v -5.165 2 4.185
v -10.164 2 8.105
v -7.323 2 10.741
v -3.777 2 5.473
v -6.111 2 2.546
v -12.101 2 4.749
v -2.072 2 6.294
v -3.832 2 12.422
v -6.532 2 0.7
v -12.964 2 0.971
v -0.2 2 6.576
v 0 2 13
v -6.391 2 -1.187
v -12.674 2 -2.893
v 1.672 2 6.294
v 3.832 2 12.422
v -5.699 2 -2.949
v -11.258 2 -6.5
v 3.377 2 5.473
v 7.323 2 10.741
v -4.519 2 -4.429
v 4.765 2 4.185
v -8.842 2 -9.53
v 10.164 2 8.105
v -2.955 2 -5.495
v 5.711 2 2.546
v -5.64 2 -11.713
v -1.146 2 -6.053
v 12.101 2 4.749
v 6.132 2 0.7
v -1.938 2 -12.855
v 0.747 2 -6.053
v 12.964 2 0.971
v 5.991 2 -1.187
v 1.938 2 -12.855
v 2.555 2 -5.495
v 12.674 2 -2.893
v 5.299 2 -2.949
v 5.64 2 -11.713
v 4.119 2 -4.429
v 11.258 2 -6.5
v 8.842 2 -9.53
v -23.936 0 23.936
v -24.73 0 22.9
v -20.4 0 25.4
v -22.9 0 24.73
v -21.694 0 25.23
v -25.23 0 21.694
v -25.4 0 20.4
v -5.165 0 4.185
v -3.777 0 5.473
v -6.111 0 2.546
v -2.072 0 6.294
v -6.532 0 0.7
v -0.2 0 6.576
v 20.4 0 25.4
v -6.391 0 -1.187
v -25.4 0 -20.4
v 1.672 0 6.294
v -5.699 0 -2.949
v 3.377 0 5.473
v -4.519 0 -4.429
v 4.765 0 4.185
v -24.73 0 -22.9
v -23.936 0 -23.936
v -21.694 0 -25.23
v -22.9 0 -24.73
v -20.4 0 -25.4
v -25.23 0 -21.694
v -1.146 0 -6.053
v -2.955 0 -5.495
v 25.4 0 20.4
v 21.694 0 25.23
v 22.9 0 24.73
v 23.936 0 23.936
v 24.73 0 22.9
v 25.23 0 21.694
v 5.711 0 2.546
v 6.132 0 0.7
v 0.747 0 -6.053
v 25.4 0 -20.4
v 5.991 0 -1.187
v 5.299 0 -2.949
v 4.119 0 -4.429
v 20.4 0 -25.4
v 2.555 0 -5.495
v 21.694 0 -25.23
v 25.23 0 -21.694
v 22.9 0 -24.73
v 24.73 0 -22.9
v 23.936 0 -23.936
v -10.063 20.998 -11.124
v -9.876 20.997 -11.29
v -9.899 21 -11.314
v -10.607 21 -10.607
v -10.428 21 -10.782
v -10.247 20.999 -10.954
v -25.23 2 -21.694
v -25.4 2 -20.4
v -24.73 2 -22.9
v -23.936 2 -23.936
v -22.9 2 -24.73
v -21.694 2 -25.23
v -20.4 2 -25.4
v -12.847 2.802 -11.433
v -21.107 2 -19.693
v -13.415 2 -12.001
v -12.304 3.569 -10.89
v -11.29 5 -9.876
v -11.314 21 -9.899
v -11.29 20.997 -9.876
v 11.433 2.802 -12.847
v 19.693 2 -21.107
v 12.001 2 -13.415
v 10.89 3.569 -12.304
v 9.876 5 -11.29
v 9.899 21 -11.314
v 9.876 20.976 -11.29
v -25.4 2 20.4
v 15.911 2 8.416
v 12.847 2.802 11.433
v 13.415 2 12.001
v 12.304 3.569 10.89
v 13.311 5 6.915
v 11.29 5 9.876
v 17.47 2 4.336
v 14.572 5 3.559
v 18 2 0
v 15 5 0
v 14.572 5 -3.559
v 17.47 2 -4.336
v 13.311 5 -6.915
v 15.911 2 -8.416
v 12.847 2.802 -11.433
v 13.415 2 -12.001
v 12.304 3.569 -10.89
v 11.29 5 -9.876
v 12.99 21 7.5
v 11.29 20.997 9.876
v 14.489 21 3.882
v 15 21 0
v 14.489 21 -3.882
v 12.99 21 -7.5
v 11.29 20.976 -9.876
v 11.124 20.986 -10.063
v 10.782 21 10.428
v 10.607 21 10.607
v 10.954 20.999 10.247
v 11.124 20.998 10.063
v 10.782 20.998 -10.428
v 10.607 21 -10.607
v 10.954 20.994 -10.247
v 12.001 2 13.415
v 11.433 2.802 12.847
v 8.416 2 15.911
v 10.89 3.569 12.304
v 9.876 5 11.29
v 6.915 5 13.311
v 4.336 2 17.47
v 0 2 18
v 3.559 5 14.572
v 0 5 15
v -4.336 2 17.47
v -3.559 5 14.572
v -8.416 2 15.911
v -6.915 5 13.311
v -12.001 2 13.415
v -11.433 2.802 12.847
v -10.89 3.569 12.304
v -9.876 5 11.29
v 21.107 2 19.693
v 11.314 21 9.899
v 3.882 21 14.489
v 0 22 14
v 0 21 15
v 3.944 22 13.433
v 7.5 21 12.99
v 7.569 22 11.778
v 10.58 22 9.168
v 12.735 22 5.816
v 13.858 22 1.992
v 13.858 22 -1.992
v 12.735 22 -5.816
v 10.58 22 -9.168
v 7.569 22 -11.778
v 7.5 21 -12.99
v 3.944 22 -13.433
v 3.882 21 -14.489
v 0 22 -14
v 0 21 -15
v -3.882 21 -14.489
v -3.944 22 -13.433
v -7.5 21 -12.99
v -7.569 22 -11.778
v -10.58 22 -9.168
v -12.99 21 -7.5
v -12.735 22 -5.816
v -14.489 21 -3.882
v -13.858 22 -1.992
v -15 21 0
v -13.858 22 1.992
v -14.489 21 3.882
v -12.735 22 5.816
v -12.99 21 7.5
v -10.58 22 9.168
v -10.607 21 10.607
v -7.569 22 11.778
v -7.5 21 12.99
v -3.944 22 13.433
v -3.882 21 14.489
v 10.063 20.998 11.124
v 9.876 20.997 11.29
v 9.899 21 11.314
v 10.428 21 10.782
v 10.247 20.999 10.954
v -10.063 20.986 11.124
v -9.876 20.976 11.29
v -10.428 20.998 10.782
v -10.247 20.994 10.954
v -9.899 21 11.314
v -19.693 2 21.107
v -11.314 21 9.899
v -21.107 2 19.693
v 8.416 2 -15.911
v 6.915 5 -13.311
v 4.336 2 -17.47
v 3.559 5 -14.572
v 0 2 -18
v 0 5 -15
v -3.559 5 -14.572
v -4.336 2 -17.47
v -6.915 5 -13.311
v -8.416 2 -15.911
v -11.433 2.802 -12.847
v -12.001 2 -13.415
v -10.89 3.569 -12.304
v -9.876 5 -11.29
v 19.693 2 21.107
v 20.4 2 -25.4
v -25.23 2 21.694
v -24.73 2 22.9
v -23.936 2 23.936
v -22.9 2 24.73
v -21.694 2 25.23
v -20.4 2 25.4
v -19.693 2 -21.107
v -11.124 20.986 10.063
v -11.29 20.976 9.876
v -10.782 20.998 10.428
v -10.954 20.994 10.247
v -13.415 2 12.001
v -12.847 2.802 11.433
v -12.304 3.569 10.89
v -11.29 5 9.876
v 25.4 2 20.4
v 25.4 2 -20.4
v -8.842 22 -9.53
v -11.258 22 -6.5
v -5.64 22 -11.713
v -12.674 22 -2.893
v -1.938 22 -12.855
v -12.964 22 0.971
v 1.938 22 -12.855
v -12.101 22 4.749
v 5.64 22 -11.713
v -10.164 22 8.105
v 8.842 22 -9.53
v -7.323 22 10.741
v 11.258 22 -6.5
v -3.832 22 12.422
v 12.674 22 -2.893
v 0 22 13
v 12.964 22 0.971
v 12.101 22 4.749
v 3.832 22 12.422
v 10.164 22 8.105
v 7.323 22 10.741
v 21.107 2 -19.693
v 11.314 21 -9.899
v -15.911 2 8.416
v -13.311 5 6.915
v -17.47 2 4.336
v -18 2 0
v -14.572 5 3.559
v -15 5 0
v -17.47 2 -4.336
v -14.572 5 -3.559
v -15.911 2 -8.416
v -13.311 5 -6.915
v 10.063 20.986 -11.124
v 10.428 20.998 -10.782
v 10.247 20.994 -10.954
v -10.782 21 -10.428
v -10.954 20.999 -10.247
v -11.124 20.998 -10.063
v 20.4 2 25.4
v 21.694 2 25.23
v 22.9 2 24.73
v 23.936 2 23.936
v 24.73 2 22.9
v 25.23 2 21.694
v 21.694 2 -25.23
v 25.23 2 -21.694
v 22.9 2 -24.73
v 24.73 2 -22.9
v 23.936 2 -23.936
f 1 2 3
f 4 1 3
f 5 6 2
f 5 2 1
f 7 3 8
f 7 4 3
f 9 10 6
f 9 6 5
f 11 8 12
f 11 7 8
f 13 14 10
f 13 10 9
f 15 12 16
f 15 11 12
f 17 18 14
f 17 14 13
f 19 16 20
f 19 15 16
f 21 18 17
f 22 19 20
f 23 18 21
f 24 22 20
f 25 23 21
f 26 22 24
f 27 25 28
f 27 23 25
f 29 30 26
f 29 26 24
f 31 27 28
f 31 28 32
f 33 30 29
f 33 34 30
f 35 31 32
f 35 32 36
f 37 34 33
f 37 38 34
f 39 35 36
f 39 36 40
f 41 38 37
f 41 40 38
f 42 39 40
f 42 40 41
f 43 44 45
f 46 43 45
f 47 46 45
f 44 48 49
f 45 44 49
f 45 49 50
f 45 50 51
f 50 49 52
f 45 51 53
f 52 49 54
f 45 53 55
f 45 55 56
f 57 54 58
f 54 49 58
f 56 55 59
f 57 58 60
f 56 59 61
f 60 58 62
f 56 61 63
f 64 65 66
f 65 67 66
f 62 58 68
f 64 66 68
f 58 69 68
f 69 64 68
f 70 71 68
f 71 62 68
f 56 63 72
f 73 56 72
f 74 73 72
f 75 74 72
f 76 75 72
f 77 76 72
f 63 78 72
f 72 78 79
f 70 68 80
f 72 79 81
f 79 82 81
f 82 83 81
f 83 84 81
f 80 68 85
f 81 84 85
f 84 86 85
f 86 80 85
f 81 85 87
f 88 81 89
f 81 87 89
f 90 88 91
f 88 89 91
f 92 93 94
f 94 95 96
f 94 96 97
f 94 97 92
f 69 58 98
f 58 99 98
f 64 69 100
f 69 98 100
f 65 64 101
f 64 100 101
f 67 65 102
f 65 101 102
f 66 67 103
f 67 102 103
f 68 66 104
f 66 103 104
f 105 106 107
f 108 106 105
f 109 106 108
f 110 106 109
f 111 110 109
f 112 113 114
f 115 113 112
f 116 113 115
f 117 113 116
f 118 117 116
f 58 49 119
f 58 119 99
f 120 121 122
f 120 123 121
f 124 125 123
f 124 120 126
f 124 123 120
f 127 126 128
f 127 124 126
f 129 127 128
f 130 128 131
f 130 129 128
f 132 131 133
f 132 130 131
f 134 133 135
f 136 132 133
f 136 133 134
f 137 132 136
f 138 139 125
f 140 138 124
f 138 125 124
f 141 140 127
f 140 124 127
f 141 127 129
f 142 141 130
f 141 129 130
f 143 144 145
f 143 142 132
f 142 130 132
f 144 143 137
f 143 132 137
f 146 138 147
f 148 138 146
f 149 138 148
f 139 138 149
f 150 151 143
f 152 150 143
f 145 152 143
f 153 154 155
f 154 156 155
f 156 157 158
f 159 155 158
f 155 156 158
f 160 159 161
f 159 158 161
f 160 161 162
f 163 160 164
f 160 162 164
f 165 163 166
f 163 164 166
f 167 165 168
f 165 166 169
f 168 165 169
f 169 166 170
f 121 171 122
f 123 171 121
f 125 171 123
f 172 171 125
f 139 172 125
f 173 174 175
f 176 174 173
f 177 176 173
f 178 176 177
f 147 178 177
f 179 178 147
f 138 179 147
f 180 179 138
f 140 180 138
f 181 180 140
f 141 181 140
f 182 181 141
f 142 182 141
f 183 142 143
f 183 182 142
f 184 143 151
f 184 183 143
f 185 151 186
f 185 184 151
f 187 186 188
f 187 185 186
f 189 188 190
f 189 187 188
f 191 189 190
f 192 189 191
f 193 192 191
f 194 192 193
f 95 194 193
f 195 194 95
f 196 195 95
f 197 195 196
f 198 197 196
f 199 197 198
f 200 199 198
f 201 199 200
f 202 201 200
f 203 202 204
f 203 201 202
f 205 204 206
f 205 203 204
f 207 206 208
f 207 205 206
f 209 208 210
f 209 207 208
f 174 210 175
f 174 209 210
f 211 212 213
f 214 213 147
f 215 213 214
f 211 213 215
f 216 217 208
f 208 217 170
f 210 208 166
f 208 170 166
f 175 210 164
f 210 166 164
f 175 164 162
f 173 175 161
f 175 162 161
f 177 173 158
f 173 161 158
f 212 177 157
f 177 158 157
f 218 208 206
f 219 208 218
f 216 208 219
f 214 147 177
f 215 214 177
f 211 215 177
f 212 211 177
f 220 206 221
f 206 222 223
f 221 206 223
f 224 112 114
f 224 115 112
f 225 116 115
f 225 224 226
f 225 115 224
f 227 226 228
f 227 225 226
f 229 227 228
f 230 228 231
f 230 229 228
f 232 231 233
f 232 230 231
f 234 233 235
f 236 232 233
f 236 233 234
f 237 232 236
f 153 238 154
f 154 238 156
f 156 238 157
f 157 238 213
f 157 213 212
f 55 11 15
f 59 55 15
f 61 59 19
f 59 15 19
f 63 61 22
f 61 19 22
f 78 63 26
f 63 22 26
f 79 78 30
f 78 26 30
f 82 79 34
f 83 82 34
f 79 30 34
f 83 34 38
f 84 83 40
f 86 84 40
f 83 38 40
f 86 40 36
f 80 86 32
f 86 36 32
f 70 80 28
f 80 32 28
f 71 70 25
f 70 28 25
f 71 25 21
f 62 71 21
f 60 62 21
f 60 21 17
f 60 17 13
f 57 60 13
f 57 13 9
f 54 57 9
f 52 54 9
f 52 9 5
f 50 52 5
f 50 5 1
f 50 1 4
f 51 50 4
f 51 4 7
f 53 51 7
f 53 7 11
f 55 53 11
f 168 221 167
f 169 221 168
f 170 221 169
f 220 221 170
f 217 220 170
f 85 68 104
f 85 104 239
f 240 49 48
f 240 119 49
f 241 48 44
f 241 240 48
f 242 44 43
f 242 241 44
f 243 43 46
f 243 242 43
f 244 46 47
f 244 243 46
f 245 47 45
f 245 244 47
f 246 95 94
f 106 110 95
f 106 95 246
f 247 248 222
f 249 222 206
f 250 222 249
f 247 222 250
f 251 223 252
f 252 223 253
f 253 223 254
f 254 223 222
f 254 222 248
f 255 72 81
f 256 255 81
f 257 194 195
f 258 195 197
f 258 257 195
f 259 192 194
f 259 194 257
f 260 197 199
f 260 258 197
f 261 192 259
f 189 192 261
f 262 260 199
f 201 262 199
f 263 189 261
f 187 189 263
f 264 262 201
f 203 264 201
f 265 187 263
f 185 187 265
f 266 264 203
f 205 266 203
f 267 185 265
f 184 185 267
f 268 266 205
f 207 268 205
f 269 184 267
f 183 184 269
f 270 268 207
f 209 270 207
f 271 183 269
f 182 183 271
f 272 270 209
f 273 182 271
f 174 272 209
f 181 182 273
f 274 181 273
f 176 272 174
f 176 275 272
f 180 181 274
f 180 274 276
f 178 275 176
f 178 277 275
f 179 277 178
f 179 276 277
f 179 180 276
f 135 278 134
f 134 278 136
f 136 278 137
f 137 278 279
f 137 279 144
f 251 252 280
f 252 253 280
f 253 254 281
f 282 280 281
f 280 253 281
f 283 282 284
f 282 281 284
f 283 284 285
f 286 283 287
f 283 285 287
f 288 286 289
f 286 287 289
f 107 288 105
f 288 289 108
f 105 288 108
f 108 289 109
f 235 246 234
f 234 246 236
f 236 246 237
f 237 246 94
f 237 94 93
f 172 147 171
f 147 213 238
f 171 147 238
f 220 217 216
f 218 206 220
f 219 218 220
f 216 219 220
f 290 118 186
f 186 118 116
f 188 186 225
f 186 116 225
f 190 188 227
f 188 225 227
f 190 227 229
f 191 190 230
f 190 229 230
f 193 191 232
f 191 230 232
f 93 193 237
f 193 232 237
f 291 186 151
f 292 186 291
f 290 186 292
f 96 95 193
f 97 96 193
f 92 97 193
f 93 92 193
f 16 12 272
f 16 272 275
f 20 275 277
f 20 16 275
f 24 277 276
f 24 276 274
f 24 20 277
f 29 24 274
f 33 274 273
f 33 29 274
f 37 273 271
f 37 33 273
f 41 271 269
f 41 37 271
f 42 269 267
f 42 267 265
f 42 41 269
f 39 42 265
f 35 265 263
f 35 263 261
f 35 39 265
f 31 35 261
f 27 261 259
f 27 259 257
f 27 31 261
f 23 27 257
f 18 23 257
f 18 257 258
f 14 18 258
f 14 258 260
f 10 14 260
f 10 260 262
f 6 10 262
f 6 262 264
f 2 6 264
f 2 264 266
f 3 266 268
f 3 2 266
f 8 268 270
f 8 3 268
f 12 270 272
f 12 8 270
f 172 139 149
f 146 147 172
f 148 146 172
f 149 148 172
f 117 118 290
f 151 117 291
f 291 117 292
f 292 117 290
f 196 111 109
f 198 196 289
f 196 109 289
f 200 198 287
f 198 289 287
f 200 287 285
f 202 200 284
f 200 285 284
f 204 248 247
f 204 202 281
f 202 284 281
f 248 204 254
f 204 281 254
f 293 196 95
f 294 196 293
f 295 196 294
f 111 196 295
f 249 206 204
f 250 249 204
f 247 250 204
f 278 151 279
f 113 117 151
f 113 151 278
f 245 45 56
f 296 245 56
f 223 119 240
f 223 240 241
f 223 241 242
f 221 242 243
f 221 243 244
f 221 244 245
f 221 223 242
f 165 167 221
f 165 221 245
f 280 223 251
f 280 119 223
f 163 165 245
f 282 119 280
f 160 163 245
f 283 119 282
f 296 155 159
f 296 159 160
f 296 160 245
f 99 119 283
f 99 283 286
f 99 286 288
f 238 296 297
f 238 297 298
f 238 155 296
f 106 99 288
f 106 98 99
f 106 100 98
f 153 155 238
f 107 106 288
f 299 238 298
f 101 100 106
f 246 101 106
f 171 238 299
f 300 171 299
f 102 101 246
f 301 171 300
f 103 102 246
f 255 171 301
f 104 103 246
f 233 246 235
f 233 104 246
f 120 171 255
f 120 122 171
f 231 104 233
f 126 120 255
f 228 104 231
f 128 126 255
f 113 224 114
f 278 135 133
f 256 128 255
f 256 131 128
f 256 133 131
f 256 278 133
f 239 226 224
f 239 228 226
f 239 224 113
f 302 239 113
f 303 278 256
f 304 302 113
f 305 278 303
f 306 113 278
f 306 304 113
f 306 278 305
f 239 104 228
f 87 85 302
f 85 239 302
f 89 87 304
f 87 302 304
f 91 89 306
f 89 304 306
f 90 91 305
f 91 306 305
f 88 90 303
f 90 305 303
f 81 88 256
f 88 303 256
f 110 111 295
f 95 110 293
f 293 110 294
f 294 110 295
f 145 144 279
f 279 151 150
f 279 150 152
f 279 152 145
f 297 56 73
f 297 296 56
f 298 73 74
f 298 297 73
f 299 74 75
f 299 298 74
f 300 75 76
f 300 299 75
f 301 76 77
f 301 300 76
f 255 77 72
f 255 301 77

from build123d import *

# Parameters (mm, degrees)
SKETCH1_W                = 50.8
SKETCH1_H                = 50.8
BOSS_EXTRUDE1_DEPTH      = 2
SKETCH2_R                = 15
SKETCH2_R_2              = 13
BOSS_EXTRUDE2_DEPTH      = 20
CHAMFER1_SIZE            = 1
FILLET1_R                = 5
BOSS_EXTRUDE4_DEPTH      = 1
BOSS_EXTRUDE4_DEPTH_BACK = 1
BOSS_EXTRUDE5_DEPTH      = 1
BOSS_EXTRUDE5_DEPTH_BACK = 1
SKETCH7_R                = 6.35
CUT_EXTRUDE1_DEPTH       = 11
CHAMFER2_SIZE            = 3


with BuildPart() as part:
    # Sketch1 → Boss-Extrude1 (new body)
    with BuildSketch(Plane(origin=(0, 0, 0), x_dir=(1, 0, 0), z_dir=(0, 1, 0))):
        Rectangle(SKETCH1_W, SKETCH1_H)
    extrude(amount=BOSS_EXTRUDE1_DEPTH)

    # Sketch2 → Boss-Extrude2 (add)
    with BuildSketch(Plane(origin=(0, 2, 0), x_dir=(1, 0, 0), z_dir=(0, 1, 0))):
        Circle(SKETCH2_R)
        Circle(SKETCH2_R_2, mode=Mode.SUBTRACT)
    extrude(amount=BOSS_EXTRUDE2_DEPTH)

    # Chamfer1
    chamfer1_edges = [part.edges().sort_by_distance(p)[0] for p in [
        (-15, 22, 0),
    ]]
    chamfer(chamfer1_edges, length=CHAMFER1_SIZE)

    # Fillet1
    fillet1_edges = [part.edges().sort_by_distance(p)[0] for p in [
        (25.4, 1, -25.4),
        (-25.4, 1, -25.4),
        (25.4, 1, 25.4),
        (-25.4, 1, 25.4),
    ]]
    fillet(fillet1_edges, radius=FILLET1_R)

    # Sketch5 → Boss-Extrude4 (add, two sides: drawn at the far end of the back side and taken through both)
    with BuildSketch(Plane(origin=(0, 0, 0), x_dir=(-0.7071067811865476, 0, -0.7071067811865476), z_dir=(0.7071067811865476, 0, -0.7071067811865476)).offset(-BOSS_EXTRUDE4_DEPTH_BACK)):
        Polygon((-15, 21), (-28.849956672, 2), (-14.211911486, 2), (-14.211911486, 20.928757868), align=None)
        Polygon((15, 21), (28.849956672, 2), (14.236311105, 2), (14.236311105, 20.928757868), align=None)
    extrude(amount=BOSS_EXTRUDE4_DEPTH + BOSS_EXTRUDE4_DEPTH_BACK)

    # Sketch6 → Boss-Extrude5 (add, two sides: drawn at the far end of the back side and taken through both)
    with BuildSketch(Plane(origin=(0, 0, 0), x_dir=(0.7071067811865475, 0, -0.7071067811865476), z_dir=(0.7071067811865476, 0, 0.7071067811865475)).offset(-BOSS_EXTRUDE5_DEPTH_BACK)):
        Polygon((-15, 21), (-28.849956672, 2), (-14.171301729, 2), (-14.171301729, 20.395924466), align=None)
        Polygon((15, 21), (28.849956672, 2), (14.152219343, 2), (14.152219343, 20.382014455), align=None)
    extrude(amount=BOSS_EXTRUDE5_DEPTH + BOSS_EXTRUDE5_DEPTH_BACK)

    # Sketch7 → Cut-Extrude1 (cut)
    with BuildSketch(Plane(origin=(0, 2, 0), x_dir=(1, 0, 0), z_dir=(0, 1, 0))):
        with Locations((-0.199881489, -0.225905454)):
            Circle(SKETCH7_R)
    extrude(amount=-CUT_EXTRUDE1_DEPTH, mode=Mode.SUBTRACT)

    # Chamfer2
    chamfer2_edges = [part.edges().sort_by_distance(p)[0] for p in [
        (0, 2, -15),
        (15, 2, 0),
        (0, 2, 15),
        (-15, 2, 0),
    ]]
    chamfer(chamfer2_edges, length=CHAMFER2_SIZE)


solid = part.part
